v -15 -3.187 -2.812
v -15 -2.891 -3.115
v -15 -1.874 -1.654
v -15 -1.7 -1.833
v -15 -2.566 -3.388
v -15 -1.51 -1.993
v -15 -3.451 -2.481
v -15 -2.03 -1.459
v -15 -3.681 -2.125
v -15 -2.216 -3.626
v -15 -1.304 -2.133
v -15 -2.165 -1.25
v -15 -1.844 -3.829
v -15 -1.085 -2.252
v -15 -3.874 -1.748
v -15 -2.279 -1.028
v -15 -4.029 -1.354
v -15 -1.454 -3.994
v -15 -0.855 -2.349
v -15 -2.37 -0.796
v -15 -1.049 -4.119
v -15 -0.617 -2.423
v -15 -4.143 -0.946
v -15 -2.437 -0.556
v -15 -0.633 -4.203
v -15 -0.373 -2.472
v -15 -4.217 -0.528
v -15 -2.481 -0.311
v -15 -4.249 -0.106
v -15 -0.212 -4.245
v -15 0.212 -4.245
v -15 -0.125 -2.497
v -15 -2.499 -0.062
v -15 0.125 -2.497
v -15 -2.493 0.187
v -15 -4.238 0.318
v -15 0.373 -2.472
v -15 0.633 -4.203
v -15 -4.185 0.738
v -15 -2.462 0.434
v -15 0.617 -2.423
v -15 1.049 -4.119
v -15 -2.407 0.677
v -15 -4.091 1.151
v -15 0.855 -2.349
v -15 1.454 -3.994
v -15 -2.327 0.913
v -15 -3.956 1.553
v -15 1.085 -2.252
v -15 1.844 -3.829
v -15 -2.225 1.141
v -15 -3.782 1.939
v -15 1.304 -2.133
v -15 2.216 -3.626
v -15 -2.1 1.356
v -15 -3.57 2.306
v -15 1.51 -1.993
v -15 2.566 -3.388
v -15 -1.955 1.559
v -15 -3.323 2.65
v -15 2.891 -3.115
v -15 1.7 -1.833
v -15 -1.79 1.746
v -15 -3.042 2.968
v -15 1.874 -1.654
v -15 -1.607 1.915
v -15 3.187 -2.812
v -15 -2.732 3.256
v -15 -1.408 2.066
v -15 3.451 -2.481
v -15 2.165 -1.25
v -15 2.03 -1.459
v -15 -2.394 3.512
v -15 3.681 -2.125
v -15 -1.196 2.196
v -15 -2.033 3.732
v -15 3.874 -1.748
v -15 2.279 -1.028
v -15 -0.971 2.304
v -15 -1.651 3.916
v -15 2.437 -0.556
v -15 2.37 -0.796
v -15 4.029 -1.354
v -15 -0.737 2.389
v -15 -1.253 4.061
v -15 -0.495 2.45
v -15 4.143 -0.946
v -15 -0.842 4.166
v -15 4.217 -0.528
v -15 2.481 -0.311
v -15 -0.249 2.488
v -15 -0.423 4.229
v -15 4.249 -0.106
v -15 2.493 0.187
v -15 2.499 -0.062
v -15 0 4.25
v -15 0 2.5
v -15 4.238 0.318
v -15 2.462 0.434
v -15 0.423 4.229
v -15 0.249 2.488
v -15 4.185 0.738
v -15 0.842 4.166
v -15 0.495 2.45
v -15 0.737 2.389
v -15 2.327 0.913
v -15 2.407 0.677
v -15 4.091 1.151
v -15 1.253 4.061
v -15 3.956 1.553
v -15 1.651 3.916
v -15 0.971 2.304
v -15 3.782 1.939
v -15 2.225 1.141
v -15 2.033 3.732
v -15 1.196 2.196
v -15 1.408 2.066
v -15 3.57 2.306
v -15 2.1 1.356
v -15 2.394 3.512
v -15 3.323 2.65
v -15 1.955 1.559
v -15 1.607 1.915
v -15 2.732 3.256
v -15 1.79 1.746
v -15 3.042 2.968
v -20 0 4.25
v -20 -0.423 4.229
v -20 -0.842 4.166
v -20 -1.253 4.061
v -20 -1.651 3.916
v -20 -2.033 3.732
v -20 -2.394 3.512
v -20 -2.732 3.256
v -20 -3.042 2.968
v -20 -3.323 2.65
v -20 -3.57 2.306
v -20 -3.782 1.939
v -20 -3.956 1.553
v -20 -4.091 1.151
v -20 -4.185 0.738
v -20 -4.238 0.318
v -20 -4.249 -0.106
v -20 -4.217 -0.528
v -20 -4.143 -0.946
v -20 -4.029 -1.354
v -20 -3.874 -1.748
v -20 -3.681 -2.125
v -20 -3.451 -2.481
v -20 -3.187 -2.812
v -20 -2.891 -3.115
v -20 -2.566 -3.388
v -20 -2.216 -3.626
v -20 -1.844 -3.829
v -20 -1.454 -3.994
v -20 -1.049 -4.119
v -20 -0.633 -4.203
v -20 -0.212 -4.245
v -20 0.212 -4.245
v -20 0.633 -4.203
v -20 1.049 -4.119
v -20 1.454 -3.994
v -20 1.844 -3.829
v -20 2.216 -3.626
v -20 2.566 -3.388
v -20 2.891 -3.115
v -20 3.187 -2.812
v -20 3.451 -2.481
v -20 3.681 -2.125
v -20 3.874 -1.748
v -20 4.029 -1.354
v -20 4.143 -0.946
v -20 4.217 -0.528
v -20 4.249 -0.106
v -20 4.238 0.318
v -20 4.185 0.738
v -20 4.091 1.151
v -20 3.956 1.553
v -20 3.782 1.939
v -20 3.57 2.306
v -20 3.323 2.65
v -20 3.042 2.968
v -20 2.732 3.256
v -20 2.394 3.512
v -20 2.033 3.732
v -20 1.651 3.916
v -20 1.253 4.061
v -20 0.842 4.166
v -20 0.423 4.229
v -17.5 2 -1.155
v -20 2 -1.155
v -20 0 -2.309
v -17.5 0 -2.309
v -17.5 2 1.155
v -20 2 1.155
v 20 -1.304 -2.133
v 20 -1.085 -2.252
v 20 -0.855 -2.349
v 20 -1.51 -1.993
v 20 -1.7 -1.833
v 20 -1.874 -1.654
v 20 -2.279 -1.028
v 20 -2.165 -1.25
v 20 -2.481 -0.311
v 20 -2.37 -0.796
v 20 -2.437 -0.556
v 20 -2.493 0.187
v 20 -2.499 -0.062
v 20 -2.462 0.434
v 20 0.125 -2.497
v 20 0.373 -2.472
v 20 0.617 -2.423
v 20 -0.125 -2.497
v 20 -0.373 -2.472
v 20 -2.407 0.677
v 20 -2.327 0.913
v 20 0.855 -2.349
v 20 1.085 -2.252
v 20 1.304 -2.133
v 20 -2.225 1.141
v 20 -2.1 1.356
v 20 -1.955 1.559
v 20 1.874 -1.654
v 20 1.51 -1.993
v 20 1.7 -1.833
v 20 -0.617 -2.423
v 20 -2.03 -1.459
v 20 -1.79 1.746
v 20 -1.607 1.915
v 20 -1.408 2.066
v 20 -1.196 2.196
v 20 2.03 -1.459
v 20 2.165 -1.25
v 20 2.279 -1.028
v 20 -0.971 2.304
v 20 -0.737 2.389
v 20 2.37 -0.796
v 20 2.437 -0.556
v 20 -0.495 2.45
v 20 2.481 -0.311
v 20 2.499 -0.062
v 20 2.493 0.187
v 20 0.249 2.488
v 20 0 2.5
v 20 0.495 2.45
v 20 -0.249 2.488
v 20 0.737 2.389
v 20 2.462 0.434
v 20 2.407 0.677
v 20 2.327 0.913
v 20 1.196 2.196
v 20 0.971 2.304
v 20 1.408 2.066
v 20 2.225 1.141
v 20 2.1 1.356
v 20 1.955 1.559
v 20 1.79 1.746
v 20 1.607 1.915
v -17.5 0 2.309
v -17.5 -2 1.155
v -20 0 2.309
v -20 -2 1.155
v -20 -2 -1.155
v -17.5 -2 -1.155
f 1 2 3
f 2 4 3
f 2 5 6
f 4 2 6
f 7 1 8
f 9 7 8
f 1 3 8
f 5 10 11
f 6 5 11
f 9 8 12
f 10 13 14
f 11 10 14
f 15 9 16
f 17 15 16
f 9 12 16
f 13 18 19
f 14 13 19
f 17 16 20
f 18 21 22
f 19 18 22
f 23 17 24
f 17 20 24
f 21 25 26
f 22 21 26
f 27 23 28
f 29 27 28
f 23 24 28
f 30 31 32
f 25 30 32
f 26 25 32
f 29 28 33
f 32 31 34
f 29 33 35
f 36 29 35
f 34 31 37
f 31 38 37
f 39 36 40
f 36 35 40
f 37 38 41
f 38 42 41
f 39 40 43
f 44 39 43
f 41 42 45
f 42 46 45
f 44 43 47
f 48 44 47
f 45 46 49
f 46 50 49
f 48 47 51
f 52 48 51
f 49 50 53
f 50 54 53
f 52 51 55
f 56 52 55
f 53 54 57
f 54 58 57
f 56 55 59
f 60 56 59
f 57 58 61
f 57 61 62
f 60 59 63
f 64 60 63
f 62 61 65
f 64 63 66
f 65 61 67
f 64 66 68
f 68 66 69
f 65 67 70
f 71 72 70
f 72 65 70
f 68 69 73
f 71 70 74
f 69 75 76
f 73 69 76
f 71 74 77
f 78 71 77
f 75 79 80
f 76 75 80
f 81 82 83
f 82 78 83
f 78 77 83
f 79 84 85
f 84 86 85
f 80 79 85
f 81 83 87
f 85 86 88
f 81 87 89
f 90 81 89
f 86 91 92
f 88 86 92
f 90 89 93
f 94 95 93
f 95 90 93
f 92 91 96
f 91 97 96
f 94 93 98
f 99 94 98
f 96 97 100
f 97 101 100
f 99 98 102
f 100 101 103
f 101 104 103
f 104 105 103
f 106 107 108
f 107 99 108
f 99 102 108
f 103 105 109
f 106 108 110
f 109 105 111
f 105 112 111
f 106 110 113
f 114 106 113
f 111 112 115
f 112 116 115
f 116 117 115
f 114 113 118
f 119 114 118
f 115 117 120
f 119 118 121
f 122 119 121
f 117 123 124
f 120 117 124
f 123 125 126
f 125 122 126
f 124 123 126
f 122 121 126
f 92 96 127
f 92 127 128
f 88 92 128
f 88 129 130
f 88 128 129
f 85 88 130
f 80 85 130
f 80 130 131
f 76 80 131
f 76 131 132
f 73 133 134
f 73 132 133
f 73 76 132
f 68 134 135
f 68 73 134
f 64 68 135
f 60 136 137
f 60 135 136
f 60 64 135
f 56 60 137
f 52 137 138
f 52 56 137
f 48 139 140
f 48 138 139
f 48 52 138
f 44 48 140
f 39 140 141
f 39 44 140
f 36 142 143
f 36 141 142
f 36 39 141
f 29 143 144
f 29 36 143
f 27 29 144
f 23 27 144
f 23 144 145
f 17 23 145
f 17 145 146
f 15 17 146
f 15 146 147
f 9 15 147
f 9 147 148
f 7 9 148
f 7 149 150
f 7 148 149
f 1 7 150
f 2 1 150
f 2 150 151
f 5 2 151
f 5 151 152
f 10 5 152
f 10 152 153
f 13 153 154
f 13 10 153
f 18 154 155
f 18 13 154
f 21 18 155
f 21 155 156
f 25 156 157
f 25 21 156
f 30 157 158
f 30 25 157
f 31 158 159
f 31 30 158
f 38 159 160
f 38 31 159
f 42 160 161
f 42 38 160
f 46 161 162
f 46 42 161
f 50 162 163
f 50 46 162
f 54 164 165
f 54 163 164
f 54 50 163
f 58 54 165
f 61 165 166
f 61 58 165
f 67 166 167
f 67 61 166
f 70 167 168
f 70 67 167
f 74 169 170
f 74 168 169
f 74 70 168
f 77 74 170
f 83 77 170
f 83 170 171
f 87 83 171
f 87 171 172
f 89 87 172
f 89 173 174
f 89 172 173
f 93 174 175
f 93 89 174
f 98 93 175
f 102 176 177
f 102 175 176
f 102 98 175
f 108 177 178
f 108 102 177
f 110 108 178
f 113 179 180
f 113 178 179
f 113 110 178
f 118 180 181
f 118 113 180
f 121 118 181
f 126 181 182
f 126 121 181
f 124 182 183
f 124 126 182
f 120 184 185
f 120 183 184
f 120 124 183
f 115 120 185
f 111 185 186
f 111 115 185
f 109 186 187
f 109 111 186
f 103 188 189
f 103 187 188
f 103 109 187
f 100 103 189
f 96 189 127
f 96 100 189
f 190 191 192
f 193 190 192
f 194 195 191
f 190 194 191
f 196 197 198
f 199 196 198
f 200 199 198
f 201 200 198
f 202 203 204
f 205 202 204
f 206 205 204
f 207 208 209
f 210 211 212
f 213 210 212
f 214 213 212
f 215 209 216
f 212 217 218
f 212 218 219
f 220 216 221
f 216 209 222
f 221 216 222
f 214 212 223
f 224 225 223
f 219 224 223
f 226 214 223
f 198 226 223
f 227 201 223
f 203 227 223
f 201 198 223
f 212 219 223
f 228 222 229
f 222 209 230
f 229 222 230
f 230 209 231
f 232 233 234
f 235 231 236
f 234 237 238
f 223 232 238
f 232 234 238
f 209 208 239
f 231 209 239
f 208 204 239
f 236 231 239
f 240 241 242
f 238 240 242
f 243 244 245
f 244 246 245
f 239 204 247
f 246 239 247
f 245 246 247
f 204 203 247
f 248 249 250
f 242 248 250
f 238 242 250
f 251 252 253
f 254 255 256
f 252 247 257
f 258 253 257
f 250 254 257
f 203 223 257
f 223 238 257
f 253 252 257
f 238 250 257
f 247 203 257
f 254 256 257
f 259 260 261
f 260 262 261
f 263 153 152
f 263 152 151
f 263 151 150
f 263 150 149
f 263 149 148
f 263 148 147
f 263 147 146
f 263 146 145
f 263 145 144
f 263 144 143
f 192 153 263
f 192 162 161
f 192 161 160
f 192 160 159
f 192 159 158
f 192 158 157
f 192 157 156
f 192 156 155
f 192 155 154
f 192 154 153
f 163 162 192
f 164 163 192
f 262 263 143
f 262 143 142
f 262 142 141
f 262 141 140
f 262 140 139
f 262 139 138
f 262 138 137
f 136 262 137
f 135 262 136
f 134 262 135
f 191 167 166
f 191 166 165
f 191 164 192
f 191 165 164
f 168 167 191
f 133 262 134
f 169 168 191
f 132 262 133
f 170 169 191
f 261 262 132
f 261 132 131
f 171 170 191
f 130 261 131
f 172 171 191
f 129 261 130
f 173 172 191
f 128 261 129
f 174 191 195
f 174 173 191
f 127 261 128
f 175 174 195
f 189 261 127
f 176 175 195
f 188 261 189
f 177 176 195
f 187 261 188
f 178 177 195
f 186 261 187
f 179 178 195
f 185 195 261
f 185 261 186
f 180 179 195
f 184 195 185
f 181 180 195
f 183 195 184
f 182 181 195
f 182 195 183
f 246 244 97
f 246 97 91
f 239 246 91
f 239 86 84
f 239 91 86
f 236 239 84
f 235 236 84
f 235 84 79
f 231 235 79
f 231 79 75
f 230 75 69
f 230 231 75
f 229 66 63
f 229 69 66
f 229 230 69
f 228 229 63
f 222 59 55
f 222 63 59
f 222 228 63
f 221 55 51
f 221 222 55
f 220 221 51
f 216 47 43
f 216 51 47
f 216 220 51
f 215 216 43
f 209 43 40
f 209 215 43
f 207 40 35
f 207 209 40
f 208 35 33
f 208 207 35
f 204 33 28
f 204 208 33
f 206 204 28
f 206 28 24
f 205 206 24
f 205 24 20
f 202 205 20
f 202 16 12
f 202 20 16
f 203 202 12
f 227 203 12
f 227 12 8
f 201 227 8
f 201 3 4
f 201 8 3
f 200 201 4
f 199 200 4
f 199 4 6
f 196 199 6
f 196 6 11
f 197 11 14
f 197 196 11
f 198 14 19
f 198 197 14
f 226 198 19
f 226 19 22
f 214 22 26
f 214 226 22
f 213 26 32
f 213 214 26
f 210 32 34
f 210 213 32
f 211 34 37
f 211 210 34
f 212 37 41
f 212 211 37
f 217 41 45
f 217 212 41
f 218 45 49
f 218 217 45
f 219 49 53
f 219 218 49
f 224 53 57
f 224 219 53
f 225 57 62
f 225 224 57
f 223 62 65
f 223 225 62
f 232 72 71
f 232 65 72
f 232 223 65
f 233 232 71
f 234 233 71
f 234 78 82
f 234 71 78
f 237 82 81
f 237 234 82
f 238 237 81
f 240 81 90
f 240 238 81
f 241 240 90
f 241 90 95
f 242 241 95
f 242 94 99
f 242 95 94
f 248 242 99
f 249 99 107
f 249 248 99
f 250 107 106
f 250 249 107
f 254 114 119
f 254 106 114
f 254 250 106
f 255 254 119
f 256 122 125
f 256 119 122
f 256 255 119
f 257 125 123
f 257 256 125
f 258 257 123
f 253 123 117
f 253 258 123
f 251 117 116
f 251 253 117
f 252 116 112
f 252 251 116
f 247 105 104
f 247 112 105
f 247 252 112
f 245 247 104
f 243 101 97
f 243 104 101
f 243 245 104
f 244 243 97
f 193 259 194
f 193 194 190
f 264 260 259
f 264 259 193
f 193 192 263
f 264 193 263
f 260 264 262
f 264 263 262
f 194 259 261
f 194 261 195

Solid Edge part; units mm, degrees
sketch "Sketch1" plane through (10.8674, 0, 10.8674) normal (0, -1, 0) x (1, 0, 0)
  line L0 (-30.8674, -10.8674) -> (-30.8674, -6.6174)
  line L1 (-30.8674, -6.6174) -> (-25.8674, -6.6174)
  line L2 (-25.8674, -6.6174) -> (-25.8674, -8.3674)
  line L3 (-25.8674, -8.3674) -> (9.1326, -8.3674)
  line L4 (9.1326, -8.3674) -> (9.1326, -10.8674)
  dimension "D1" = 5
  dimension "D2" = 35
revolve "RevolvedProtrusion1" add sketch "Sketch1" angle 360 about axis through (16.5, 0, 0) along (-1, 0, 0)
sketch "Sketch2" plane through (-20, 0, 0) normal (-1, 0, 0) x (0, 0, -1)
  line L0 (2.3094, 0) -> (1.1547, 2)
  line L1 (1.1547, 2) -> (-1.1547, 2)
  line L2 (-1.1547, 2) -> (-2.3094, 0)
  line L3 (-2.3094, 0) -> (-1.1547, -2)
  line L4 (-1.1547, -2) -> (1.1547, -2)
  line L5 (1.1547, -2) -> (2.3094, 0)
  dimension "D1" = 4
extrude "Cutout1" cut sketch "Sketch2" against normal blind 2.5
cosmetic_thread "Thread1" size "M5"
properties material "Steel"
